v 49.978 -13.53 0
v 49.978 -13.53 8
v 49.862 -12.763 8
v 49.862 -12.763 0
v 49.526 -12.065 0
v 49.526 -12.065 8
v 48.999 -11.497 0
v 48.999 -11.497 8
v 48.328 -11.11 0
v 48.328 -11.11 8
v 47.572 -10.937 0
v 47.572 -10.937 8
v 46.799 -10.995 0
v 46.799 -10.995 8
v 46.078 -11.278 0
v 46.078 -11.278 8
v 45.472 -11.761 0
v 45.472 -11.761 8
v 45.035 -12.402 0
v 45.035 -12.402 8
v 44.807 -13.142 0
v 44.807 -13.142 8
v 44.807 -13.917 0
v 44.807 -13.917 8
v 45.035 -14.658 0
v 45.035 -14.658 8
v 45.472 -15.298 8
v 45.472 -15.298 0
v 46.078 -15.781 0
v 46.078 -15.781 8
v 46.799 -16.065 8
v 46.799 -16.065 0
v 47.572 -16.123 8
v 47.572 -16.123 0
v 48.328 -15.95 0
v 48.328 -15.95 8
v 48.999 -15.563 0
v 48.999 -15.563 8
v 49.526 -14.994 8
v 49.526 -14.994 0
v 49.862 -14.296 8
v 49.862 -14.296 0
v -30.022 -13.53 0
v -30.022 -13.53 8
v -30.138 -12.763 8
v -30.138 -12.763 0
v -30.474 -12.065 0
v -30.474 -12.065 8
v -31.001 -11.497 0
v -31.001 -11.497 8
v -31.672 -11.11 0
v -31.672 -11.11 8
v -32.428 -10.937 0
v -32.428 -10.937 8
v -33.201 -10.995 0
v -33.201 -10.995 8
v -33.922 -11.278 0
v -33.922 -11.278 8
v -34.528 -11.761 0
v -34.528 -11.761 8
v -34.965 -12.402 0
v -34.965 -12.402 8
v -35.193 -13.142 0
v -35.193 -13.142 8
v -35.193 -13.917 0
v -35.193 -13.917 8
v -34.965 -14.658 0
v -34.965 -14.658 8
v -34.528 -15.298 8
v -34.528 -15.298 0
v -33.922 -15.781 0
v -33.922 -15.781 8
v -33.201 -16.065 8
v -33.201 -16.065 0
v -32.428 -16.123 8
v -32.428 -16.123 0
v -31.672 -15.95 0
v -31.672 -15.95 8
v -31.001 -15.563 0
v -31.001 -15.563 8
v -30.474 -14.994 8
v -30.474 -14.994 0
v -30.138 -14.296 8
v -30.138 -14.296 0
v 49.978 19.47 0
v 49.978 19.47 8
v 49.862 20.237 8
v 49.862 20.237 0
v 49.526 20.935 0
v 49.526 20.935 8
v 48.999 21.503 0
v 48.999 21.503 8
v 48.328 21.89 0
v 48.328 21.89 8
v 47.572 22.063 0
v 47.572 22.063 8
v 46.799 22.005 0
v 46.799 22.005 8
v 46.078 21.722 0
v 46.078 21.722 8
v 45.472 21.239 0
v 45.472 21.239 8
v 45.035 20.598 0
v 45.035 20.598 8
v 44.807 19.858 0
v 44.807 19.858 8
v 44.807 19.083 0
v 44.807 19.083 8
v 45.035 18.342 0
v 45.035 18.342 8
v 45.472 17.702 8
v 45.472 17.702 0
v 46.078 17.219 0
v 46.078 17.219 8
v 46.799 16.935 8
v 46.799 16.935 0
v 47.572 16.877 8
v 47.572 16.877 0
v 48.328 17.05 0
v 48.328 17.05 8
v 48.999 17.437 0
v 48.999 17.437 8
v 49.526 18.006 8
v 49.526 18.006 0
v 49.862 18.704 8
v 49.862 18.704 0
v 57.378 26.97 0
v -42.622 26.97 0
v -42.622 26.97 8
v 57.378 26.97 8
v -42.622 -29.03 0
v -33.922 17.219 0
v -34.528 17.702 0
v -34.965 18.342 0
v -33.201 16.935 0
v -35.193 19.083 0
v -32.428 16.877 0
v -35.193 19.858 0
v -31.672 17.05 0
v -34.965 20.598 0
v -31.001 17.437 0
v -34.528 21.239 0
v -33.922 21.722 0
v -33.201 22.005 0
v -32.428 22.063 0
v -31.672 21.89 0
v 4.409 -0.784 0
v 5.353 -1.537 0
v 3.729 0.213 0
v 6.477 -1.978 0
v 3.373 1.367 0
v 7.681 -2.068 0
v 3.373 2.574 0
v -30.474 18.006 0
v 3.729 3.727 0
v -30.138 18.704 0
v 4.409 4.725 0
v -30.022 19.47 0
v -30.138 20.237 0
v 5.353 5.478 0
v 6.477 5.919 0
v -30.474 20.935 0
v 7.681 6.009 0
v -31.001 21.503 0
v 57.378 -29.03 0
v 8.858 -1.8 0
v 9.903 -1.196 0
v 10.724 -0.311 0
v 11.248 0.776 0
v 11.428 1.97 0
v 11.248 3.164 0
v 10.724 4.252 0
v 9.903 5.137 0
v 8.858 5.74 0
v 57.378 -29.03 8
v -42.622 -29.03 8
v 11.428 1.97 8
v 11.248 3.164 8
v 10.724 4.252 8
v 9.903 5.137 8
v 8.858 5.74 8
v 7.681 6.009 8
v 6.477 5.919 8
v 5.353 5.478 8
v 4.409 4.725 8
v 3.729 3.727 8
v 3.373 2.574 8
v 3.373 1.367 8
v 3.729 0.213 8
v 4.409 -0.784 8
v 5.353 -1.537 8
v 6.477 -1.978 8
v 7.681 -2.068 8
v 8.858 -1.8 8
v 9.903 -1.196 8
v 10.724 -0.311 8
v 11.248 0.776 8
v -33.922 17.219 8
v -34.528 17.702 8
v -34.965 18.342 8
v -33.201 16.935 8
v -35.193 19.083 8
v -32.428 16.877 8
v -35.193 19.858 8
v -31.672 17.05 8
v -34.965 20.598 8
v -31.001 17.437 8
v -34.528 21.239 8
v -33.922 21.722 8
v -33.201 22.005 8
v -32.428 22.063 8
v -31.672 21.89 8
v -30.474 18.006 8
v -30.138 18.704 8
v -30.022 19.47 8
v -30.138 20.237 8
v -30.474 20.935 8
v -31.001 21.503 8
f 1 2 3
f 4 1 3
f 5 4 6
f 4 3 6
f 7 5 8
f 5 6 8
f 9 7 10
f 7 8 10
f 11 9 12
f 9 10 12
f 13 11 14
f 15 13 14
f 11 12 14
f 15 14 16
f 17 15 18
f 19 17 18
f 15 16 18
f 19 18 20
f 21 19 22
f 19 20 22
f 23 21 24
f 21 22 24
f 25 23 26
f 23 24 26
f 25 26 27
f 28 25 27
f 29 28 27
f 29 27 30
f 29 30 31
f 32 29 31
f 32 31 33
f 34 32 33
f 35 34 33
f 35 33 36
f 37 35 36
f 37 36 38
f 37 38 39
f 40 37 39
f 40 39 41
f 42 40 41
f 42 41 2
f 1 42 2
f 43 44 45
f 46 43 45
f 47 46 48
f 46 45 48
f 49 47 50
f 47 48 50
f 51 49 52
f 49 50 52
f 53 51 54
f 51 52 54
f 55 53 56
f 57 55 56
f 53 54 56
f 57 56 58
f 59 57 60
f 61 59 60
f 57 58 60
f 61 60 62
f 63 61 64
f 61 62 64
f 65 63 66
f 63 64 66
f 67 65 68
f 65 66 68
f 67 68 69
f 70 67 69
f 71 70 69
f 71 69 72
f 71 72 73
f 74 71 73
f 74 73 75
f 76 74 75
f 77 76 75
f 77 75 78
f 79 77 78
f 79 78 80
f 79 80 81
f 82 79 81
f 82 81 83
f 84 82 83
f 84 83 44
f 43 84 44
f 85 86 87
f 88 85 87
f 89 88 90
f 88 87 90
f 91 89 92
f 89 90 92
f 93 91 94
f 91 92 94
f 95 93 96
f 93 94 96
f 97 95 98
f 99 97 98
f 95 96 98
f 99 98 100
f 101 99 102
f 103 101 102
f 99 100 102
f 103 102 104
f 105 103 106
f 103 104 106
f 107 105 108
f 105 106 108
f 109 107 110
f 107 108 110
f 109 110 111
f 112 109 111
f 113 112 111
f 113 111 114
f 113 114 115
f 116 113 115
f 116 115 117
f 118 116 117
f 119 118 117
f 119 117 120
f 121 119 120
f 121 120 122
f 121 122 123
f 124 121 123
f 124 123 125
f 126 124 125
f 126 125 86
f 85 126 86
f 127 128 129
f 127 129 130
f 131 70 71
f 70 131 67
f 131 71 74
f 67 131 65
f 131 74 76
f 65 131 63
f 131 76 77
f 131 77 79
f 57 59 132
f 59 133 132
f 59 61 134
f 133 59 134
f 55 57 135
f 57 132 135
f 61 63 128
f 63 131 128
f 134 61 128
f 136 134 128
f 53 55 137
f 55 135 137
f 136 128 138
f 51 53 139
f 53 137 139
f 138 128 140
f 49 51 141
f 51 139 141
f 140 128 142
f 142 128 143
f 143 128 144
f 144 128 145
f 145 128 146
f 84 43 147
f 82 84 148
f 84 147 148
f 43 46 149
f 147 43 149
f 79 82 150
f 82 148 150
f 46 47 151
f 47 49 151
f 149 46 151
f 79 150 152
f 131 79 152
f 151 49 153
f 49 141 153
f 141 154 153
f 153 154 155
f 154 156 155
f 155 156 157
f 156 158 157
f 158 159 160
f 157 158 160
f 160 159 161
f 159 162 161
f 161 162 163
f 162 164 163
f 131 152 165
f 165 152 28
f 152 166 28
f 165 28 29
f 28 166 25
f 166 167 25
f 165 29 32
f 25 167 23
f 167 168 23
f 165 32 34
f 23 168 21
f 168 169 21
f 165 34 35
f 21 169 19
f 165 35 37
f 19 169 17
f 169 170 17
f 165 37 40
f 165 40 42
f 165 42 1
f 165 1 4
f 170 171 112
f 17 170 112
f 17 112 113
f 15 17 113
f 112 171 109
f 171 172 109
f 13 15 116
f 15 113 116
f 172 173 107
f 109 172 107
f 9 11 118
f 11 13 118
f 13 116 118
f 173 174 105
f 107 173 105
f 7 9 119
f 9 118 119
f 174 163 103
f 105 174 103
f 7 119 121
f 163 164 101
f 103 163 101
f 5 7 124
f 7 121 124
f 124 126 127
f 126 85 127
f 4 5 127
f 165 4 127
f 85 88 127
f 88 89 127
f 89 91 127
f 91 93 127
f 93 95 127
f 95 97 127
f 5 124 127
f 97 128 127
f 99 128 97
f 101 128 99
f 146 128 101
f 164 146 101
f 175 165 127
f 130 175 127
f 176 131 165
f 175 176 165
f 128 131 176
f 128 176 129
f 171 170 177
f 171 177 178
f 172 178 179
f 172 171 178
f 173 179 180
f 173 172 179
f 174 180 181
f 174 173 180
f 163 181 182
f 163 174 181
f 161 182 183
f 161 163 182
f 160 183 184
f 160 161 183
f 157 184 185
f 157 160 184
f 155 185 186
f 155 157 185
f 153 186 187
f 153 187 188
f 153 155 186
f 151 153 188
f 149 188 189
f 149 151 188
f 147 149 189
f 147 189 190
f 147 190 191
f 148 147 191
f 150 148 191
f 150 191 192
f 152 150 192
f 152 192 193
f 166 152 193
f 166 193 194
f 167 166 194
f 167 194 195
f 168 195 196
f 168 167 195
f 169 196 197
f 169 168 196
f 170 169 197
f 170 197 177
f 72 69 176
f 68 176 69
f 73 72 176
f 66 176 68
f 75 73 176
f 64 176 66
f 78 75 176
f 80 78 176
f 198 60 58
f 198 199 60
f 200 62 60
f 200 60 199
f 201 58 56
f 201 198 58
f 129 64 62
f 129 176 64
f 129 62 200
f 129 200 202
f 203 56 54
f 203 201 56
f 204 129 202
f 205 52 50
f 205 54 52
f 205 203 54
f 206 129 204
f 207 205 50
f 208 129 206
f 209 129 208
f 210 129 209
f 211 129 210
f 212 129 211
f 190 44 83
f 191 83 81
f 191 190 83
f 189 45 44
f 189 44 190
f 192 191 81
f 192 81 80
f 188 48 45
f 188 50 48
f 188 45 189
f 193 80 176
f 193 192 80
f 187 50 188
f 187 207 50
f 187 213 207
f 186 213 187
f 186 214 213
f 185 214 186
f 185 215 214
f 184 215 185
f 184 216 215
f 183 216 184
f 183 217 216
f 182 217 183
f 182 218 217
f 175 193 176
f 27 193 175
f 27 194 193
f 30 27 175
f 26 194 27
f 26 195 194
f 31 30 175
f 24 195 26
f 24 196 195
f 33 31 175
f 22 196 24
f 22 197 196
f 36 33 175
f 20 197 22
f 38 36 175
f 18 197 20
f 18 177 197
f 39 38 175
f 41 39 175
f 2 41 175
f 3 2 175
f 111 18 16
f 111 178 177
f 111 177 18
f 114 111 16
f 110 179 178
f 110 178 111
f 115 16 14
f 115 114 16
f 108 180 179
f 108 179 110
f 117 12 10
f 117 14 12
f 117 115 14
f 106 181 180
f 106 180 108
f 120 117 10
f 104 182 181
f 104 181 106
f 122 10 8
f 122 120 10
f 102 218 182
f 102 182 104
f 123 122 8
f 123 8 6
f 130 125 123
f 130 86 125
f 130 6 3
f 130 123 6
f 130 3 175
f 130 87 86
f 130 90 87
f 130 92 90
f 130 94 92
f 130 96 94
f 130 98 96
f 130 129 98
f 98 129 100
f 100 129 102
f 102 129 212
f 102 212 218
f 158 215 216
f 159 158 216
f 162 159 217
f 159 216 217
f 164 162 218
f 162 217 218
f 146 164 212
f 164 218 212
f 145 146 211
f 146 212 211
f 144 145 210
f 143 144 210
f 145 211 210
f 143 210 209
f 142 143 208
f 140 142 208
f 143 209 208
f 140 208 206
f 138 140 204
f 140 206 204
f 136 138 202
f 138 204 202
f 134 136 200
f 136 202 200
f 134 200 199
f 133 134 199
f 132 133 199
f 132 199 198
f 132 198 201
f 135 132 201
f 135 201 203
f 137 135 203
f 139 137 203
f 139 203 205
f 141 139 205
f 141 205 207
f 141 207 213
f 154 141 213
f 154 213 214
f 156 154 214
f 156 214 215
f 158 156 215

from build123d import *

# Parameters (mm, degrees)
IZIM1_W                     = 100
IZIM1_H                     = 56
IZIM1_R                     = 4.05
Y_KSEKLIK_EKSTR_ZYON1_DEPTH = 8
IZIM3_R                     = 2.6
KES_EKSTR_ZYON2_DEPTH       = 10


with BuildPart() as part:
    # Çizim1 → Yükseklik-Ekstrüzyon1 (new body)
    with BuildSketch(Plane.XY):
        with Locations((7.377917159, -1.029772329)):
            Rectangle(IZIM1_W, IZIM1_H)
        with Locations((7.377917159, 1.970227671)):
            Circle(IZIM1_R, mode=Mode.SUBTRACT)
    extrude(amount=Y_KSEKLIK_EKSTR_ZYON1_DEPTH)

    # Çizim3 → Kes-Ekstrüzyon2 (cut)
    with BuildSketch(Plane.XY.offset(8)):
        with Locations((-32.622082841, 19.470227671)):
            Circle(IZIM3_R)
        with Locations((47.377917159, 19.470227671)):
            Circle(IZIM3_R)
        with Locations((47.377917159, -13.529772329)):
            Circle(IZIM3_R)
        with Locations((-32.622082841, -13.529772329)):
            Circle(IZIM3_R)
    extrude(amount=-KES_EKSTR_ZYON2_DEPTH, mode=Mode.SUBTRACT)


solid = part.part
